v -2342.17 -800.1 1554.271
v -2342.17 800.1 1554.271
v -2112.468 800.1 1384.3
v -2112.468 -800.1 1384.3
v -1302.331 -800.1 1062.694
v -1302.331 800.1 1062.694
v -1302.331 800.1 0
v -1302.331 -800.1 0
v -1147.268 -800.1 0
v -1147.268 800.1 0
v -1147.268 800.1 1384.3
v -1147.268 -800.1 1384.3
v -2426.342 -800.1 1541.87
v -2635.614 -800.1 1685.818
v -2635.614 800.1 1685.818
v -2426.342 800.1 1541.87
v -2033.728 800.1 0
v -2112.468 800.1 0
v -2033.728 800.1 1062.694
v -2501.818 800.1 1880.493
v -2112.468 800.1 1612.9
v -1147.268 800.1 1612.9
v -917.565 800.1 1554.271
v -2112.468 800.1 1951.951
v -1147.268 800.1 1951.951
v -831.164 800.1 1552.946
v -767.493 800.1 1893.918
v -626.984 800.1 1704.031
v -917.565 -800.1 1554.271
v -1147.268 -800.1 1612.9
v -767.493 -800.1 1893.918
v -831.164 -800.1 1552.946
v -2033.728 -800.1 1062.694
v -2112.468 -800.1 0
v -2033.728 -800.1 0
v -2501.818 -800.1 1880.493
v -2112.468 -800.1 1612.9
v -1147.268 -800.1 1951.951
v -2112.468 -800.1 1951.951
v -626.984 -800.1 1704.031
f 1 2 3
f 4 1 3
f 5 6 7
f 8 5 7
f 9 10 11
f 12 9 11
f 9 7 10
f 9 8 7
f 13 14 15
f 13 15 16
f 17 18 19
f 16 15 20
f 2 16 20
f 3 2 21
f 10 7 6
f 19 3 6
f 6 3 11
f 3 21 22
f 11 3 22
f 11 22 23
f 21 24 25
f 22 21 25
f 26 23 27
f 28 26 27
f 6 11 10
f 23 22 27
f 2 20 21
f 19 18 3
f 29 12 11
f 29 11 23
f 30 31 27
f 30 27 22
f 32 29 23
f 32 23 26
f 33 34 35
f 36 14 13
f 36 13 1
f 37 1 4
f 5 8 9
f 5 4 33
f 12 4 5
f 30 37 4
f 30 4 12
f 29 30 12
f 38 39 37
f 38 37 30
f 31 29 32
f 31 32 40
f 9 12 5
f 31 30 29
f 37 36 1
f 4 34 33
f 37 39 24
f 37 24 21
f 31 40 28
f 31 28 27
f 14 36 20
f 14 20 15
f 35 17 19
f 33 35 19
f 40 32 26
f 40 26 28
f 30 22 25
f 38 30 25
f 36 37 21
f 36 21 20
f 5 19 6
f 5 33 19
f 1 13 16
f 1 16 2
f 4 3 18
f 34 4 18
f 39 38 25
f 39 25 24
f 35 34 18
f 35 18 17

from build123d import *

# Parameters (mm, degrees)
F1_DEPTH = 800.1


with BuildPart() as f1:
    # F0 (on Front) → F1 (new body, symmetric)
    with BuildSketch(Plane.XZ):
        Polygon((-1302.331328, 0), (-1147.267534, 0), (-1147.267534, 1384.3), (-917.565436, 1554.270611), (-831.164002, 1552.946022), (-626.98436, 1704.03101), (-767.493399, 1893.918077), (-1147.267534, 1612.9), (-1147.267534, 1951.950783), (-2112.467534, 1951.950783), (-2112.467534, 1612.9), (-2501.81771, 1880.492963), (-2635.614192, 1685.817874), (-2426.341646, 1541.869962), (-2342.169632, 1554.270611), (-2112.467534, 1384.3), (-2112.467534, 0), (-2033.727534, 0), (-2033.727534, 1062.69436), (-1302.331328, 1062.69436), align=None)
    extrude(amount=F1_DEPTH, both=True)


solid = f1.part
